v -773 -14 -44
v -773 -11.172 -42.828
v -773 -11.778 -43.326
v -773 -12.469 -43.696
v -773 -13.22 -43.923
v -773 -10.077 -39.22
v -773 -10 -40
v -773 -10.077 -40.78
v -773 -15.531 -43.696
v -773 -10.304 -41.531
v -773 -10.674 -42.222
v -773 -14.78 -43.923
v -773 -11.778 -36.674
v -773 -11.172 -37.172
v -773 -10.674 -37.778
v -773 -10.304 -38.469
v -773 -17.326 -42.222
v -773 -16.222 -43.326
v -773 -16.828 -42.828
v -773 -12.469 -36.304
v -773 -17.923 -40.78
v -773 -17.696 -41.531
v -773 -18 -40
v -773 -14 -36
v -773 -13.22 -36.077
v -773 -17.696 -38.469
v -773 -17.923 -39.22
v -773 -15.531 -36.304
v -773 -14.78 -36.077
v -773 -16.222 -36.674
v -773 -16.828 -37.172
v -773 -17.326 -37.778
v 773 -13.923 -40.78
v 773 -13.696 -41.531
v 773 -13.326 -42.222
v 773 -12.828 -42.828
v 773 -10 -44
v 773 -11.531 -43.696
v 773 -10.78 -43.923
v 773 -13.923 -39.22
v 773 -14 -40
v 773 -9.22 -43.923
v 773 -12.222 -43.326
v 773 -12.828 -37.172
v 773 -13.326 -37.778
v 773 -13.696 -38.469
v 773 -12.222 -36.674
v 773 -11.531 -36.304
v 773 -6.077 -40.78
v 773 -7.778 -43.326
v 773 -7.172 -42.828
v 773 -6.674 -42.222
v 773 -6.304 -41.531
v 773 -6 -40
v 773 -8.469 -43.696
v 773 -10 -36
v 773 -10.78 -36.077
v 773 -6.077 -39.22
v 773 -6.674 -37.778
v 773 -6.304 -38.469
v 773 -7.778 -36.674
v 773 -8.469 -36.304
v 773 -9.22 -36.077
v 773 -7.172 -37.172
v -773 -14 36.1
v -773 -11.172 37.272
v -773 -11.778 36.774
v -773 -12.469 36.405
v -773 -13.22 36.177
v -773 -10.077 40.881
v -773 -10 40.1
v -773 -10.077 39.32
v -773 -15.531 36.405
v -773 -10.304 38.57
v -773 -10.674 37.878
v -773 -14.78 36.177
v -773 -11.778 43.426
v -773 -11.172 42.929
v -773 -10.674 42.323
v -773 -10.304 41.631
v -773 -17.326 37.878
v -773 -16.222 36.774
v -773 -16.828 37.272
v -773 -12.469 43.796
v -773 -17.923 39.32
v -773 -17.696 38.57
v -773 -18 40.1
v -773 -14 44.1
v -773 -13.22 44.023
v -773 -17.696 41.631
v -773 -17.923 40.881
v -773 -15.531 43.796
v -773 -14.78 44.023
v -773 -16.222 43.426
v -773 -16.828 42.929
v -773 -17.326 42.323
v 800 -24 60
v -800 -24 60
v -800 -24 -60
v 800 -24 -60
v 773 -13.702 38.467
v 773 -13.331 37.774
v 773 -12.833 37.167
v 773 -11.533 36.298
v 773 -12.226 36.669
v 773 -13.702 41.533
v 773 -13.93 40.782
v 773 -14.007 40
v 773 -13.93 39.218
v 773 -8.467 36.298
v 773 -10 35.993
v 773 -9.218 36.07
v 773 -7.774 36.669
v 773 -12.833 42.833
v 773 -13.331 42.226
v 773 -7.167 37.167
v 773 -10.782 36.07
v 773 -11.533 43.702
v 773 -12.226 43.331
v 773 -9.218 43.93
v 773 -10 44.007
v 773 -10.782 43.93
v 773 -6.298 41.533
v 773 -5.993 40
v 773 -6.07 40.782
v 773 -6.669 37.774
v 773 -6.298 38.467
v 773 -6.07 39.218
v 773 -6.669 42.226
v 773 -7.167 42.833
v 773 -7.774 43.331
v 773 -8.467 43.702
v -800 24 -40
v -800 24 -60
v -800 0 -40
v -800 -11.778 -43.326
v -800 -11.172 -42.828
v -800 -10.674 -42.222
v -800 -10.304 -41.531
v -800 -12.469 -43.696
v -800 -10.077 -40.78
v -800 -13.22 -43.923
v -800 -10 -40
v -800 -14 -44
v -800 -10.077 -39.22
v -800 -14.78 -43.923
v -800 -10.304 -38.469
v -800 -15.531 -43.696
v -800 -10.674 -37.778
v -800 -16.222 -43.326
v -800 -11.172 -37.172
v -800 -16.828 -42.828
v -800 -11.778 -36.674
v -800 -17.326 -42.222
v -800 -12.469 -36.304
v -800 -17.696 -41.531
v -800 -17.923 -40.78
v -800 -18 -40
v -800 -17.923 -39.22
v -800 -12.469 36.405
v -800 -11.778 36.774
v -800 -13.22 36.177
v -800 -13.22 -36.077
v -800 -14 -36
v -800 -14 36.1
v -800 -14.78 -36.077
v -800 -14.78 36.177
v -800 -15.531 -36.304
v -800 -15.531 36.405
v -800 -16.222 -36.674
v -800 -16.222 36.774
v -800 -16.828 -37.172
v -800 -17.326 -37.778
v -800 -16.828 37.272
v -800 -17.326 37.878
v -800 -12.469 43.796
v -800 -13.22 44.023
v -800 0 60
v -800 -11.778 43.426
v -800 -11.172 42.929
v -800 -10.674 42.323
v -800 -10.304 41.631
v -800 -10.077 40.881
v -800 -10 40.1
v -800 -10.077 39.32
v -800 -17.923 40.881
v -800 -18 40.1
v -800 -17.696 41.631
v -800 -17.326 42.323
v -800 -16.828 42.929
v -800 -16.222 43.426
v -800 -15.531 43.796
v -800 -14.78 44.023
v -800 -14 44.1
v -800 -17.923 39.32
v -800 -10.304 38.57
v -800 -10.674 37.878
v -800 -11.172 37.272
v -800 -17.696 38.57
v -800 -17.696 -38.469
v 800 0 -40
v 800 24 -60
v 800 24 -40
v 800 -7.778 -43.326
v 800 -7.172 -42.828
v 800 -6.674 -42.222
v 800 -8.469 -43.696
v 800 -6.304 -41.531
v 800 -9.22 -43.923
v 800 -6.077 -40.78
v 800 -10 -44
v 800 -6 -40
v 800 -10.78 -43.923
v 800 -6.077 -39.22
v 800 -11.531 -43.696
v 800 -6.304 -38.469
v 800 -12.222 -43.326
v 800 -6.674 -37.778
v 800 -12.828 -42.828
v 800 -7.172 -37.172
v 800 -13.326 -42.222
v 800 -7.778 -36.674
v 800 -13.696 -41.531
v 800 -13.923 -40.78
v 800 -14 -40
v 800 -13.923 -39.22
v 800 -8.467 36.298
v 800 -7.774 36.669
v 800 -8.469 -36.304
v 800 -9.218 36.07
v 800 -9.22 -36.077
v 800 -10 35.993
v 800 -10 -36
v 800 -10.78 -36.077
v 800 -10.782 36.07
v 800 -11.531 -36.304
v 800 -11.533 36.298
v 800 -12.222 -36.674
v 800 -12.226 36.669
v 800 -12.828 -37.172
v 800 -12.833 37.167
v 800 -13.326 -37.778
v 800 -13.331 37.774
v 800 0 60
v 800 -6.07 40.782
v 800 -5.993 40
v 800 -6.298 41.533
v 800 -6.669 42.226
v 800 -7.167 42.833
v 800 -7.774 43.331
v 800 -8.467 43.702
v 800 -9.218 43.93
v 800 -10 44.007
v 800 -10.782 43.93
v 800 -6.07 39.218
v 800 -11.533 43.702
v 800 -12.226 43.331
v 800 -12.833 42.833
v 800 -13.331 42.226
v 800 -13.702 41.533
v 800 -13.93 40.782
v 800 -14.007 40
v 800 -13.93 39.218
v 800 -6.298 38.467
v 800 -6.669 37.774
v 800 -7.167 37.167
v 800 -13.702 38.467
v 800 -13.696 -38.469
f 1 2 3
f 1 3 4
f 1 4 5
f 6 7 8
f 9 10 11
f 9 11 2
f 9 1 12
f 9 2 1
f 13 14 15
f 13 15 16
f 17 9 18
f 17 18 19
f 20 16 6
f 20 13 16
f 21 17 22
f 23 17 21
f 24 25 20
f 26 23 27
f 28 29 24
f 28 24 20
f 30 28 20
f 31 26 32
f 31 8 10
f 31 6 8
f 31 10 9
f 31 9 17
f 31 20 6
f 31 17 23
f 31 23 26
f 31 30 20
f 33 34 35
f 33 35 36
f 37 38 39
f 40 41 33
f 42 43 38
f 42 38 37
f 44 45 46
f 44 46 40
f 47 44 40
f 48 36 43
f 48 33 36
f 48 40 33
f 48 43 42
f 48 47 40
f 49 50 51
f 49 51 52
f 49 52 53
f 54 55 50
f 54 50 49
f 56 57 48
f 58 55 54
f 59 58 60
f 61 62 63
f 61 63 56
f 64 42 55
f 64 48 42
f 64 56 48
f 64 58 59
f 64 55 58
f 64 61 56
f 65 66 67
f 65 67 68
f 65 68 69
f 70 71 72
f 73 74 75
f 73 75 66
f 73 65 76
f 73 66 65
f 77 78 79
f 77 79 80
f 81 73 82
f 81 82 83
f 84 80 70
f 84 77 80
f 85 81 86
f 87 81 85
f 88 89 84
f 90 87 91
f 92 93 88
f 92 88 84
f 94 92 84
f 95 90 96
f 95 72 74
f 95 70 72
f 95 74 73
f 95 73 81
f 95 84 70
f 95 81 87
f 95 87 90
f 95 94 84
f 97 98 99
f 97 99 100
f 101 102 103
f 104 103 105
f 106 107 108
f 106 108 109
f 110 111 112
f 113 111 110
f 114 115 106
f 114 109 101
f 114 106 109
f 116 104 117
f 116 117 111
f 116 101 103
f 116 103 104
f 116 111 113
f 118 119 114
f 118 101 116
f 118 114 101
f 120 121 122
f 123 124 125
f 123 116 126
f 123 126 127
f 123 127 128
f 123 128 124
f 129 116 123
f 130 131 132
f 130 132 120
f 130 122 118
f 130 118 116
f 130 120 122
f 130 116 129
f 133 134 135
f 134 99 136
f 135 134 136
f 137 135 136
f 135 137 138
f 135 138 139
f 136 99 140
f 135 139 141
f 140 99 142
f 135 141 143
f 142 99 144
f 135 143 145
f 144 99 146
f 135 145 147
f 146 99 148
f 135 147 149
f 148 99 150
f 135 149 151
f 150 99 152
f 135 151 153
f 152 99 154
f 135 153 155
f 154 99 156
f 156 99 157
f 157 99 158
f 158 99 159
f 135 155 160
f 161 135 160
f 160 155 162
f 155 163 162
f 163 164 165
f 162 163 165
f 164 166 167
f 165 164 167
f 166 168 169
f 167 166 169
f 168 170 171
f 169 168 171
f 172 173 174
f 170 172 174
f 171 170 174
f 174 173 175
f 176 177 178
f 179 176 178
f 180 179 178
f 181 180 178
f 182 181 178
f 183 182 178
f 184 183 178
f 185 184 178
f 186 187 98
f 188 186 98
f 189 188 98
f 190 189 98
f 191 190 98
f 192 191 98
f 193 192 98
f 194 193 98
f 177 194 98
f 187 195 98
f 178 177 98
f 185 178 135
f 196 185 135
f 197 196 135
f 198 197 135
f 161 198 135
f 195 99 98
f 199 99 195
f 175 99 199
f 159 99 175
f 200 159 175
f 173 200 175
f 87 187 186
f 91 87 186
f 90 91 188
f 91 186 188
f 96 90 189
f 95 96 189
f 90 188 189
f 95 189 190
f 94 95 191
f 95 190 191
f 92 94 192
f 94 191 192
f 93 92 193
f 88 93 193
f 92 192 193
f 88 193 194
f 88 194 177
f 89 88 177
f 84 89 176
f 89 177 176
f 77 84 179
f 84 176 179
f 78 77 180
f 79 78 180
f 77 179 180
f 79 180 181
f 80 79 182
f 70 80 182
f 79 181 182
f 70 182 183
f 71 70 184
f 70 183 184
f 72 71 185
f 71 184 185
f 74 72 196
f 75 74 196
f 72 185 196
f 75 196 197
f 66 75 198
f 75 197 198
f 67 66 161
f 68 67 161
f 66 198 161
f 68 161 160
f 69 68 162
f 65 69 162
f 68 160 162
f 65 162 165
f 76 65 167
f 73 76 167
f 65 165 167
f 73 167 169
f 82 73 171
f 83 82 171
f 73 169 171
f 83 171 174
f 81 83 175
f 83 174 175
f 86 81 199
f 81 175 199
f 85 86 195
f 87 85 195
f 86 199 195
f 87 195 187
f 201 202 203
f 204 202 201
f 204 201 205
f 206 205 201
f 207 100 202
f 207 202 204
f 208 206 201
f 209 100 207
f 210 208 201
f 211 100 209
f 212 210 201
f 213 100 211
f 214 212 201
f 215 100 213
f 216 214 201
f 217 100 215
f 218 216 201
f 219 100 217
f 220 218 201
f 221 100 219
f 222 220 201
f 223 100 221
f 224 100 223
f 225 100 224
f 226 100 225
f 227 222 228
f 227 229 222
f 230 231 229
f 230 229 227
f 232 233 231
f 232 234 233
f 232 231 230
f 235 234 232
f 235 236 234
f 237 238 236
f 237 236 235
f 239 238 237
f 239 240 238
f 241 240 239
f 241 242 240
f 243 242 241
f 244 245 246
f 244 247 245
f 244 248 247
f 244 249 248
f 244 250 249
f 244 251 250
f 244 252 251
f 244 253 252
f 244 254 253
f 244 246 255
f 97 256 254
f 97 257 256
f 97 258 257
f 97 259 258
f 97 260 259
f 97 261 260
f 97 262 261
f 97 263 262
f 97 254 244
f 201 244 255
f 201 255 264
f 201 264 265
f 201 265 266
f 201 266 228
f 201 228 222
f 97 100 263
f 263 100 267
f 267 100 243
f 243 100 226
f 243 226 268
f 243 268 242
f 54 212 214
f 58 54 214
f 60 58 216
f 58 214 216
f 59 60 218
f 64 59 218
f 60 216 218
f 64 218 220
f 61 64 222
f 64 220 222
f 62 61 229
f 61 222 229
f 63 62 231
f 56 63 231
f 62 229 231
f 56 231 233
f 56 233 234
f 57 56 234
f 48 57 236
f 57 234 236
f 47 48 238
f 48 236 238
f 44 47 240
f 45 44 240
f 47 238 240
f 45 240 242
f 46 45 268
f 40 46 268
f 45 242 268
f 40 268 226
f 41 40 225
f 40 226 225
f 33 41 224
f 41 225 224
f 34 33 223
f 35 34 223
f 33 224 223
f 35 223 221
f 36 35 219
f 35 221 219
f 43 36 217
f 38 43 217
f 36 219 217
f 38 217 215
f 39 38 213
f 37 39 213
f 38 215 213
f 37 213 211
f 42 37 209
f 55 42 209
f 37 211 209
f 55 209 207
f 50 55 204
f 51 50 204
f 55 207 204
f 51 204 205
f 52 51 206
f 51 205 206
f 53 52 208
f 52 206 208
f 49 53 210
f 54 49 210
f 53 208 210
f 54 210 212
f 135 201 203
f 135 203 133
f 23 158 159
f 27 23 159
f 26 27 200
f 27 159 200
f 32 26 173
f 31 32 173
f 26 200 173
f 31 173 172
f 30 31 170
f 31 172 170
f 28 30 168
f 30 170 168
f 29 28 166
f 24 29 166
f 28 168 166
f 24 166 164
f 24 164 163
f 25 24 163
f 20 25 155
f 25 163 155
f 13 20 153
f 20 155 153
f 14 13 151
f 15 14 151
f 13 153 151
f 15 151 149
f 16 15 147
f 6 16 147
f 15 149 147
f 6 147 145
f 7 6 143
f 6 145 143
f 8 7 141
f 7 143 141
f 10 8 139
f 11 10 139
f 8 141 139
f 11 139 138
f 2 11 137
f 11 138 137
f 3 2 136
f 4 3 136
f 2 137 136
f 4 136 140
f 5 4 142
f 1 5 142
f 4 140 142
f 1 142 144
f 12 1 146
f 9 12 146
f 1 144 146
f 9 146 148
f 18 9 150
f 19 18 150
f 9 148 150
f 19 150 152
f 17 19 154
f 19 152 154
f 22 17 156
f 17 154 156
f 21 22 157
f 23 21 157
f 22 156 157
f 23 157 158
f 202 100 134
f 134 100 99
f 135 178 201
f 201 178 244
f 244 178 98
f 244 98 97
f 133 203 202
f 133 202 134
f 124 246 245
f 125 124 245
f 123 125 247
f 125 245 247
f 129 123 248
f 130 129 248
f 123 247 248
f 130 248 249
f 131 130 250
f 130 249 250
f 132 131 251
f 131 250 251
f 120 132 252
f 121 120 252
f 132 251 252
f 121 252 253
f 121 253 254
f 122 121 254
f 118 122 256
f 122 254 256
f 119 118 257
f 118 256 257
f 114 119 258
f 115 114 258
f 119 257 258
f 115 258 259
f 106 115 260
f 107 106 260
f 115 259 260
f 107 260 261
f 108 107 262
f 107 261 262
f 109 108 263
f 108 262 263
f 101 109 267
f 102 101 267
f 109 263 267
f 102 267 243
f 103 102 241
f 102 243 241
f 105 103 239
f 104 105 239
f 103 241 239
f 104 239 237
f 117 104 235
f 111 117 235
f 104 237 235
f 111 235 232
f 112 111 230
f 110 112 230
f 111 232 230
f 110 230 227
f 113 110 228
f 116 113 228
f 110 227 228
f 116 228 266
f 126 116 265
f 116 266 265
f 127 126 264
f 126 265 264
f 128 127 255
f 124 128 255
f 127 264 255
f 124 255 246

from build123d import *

# Parameters (mm, degrees)
F0_W     = 1600
F0_H     = 120
F1_DEPTH = 24
F2_R     = 4.006659
F2_R_2   = 4
F3_DEPTH = 27
F4_R     = 4
F5_DEPTH = 27
F6_W     = 1600
F6_H     = 20
F7_DEPTH = 24


with BuildPart() as f1:
    # F0 (on Front) → F1 (new body)
    with BuildSketch(Plane.XZ):
        Rectangle(F0_W, F0_H)
    extrude(amount=F1_DEPTH)

    # F2 (on face) → F3 (cut)
    with BuildSketch(Plane.YZ.offset(800)):
        with Locations((-10, 40)):
            Circle(F2_R)
        with Locations((-10, -40)):
            Circle(F2_R_2)
    extrude(amount=-F3_DEPTH, mode=Mode.SUBTRACT)

    # F4 (on face) → F5 (cut)
    with BuildSketch(Plane(origin=(-800, 0, 0), x_dir=(0, -1, 0), z_dir=(-1, 0, 0))):
        with Locations((14, 40.100251)):
            Circle(F4_R)
        with Locations((14, -40)):
            Circle(F4_R)
    extrude(amount=-F5_DEPTH, mode=Mode.SUBTRACT)

    # F6 (on face) → F7 (join)
    with BuildSketch(Plane(origin=(0, 0, 0), x_dir=(-1, 0, 0), z_dir=(0, 1, 0))):
        with Locations((0, -50)):
            Rectangle(F6_W, F6_H)
    extrude(amount=F7_DEPTH)


solid = f1.part
